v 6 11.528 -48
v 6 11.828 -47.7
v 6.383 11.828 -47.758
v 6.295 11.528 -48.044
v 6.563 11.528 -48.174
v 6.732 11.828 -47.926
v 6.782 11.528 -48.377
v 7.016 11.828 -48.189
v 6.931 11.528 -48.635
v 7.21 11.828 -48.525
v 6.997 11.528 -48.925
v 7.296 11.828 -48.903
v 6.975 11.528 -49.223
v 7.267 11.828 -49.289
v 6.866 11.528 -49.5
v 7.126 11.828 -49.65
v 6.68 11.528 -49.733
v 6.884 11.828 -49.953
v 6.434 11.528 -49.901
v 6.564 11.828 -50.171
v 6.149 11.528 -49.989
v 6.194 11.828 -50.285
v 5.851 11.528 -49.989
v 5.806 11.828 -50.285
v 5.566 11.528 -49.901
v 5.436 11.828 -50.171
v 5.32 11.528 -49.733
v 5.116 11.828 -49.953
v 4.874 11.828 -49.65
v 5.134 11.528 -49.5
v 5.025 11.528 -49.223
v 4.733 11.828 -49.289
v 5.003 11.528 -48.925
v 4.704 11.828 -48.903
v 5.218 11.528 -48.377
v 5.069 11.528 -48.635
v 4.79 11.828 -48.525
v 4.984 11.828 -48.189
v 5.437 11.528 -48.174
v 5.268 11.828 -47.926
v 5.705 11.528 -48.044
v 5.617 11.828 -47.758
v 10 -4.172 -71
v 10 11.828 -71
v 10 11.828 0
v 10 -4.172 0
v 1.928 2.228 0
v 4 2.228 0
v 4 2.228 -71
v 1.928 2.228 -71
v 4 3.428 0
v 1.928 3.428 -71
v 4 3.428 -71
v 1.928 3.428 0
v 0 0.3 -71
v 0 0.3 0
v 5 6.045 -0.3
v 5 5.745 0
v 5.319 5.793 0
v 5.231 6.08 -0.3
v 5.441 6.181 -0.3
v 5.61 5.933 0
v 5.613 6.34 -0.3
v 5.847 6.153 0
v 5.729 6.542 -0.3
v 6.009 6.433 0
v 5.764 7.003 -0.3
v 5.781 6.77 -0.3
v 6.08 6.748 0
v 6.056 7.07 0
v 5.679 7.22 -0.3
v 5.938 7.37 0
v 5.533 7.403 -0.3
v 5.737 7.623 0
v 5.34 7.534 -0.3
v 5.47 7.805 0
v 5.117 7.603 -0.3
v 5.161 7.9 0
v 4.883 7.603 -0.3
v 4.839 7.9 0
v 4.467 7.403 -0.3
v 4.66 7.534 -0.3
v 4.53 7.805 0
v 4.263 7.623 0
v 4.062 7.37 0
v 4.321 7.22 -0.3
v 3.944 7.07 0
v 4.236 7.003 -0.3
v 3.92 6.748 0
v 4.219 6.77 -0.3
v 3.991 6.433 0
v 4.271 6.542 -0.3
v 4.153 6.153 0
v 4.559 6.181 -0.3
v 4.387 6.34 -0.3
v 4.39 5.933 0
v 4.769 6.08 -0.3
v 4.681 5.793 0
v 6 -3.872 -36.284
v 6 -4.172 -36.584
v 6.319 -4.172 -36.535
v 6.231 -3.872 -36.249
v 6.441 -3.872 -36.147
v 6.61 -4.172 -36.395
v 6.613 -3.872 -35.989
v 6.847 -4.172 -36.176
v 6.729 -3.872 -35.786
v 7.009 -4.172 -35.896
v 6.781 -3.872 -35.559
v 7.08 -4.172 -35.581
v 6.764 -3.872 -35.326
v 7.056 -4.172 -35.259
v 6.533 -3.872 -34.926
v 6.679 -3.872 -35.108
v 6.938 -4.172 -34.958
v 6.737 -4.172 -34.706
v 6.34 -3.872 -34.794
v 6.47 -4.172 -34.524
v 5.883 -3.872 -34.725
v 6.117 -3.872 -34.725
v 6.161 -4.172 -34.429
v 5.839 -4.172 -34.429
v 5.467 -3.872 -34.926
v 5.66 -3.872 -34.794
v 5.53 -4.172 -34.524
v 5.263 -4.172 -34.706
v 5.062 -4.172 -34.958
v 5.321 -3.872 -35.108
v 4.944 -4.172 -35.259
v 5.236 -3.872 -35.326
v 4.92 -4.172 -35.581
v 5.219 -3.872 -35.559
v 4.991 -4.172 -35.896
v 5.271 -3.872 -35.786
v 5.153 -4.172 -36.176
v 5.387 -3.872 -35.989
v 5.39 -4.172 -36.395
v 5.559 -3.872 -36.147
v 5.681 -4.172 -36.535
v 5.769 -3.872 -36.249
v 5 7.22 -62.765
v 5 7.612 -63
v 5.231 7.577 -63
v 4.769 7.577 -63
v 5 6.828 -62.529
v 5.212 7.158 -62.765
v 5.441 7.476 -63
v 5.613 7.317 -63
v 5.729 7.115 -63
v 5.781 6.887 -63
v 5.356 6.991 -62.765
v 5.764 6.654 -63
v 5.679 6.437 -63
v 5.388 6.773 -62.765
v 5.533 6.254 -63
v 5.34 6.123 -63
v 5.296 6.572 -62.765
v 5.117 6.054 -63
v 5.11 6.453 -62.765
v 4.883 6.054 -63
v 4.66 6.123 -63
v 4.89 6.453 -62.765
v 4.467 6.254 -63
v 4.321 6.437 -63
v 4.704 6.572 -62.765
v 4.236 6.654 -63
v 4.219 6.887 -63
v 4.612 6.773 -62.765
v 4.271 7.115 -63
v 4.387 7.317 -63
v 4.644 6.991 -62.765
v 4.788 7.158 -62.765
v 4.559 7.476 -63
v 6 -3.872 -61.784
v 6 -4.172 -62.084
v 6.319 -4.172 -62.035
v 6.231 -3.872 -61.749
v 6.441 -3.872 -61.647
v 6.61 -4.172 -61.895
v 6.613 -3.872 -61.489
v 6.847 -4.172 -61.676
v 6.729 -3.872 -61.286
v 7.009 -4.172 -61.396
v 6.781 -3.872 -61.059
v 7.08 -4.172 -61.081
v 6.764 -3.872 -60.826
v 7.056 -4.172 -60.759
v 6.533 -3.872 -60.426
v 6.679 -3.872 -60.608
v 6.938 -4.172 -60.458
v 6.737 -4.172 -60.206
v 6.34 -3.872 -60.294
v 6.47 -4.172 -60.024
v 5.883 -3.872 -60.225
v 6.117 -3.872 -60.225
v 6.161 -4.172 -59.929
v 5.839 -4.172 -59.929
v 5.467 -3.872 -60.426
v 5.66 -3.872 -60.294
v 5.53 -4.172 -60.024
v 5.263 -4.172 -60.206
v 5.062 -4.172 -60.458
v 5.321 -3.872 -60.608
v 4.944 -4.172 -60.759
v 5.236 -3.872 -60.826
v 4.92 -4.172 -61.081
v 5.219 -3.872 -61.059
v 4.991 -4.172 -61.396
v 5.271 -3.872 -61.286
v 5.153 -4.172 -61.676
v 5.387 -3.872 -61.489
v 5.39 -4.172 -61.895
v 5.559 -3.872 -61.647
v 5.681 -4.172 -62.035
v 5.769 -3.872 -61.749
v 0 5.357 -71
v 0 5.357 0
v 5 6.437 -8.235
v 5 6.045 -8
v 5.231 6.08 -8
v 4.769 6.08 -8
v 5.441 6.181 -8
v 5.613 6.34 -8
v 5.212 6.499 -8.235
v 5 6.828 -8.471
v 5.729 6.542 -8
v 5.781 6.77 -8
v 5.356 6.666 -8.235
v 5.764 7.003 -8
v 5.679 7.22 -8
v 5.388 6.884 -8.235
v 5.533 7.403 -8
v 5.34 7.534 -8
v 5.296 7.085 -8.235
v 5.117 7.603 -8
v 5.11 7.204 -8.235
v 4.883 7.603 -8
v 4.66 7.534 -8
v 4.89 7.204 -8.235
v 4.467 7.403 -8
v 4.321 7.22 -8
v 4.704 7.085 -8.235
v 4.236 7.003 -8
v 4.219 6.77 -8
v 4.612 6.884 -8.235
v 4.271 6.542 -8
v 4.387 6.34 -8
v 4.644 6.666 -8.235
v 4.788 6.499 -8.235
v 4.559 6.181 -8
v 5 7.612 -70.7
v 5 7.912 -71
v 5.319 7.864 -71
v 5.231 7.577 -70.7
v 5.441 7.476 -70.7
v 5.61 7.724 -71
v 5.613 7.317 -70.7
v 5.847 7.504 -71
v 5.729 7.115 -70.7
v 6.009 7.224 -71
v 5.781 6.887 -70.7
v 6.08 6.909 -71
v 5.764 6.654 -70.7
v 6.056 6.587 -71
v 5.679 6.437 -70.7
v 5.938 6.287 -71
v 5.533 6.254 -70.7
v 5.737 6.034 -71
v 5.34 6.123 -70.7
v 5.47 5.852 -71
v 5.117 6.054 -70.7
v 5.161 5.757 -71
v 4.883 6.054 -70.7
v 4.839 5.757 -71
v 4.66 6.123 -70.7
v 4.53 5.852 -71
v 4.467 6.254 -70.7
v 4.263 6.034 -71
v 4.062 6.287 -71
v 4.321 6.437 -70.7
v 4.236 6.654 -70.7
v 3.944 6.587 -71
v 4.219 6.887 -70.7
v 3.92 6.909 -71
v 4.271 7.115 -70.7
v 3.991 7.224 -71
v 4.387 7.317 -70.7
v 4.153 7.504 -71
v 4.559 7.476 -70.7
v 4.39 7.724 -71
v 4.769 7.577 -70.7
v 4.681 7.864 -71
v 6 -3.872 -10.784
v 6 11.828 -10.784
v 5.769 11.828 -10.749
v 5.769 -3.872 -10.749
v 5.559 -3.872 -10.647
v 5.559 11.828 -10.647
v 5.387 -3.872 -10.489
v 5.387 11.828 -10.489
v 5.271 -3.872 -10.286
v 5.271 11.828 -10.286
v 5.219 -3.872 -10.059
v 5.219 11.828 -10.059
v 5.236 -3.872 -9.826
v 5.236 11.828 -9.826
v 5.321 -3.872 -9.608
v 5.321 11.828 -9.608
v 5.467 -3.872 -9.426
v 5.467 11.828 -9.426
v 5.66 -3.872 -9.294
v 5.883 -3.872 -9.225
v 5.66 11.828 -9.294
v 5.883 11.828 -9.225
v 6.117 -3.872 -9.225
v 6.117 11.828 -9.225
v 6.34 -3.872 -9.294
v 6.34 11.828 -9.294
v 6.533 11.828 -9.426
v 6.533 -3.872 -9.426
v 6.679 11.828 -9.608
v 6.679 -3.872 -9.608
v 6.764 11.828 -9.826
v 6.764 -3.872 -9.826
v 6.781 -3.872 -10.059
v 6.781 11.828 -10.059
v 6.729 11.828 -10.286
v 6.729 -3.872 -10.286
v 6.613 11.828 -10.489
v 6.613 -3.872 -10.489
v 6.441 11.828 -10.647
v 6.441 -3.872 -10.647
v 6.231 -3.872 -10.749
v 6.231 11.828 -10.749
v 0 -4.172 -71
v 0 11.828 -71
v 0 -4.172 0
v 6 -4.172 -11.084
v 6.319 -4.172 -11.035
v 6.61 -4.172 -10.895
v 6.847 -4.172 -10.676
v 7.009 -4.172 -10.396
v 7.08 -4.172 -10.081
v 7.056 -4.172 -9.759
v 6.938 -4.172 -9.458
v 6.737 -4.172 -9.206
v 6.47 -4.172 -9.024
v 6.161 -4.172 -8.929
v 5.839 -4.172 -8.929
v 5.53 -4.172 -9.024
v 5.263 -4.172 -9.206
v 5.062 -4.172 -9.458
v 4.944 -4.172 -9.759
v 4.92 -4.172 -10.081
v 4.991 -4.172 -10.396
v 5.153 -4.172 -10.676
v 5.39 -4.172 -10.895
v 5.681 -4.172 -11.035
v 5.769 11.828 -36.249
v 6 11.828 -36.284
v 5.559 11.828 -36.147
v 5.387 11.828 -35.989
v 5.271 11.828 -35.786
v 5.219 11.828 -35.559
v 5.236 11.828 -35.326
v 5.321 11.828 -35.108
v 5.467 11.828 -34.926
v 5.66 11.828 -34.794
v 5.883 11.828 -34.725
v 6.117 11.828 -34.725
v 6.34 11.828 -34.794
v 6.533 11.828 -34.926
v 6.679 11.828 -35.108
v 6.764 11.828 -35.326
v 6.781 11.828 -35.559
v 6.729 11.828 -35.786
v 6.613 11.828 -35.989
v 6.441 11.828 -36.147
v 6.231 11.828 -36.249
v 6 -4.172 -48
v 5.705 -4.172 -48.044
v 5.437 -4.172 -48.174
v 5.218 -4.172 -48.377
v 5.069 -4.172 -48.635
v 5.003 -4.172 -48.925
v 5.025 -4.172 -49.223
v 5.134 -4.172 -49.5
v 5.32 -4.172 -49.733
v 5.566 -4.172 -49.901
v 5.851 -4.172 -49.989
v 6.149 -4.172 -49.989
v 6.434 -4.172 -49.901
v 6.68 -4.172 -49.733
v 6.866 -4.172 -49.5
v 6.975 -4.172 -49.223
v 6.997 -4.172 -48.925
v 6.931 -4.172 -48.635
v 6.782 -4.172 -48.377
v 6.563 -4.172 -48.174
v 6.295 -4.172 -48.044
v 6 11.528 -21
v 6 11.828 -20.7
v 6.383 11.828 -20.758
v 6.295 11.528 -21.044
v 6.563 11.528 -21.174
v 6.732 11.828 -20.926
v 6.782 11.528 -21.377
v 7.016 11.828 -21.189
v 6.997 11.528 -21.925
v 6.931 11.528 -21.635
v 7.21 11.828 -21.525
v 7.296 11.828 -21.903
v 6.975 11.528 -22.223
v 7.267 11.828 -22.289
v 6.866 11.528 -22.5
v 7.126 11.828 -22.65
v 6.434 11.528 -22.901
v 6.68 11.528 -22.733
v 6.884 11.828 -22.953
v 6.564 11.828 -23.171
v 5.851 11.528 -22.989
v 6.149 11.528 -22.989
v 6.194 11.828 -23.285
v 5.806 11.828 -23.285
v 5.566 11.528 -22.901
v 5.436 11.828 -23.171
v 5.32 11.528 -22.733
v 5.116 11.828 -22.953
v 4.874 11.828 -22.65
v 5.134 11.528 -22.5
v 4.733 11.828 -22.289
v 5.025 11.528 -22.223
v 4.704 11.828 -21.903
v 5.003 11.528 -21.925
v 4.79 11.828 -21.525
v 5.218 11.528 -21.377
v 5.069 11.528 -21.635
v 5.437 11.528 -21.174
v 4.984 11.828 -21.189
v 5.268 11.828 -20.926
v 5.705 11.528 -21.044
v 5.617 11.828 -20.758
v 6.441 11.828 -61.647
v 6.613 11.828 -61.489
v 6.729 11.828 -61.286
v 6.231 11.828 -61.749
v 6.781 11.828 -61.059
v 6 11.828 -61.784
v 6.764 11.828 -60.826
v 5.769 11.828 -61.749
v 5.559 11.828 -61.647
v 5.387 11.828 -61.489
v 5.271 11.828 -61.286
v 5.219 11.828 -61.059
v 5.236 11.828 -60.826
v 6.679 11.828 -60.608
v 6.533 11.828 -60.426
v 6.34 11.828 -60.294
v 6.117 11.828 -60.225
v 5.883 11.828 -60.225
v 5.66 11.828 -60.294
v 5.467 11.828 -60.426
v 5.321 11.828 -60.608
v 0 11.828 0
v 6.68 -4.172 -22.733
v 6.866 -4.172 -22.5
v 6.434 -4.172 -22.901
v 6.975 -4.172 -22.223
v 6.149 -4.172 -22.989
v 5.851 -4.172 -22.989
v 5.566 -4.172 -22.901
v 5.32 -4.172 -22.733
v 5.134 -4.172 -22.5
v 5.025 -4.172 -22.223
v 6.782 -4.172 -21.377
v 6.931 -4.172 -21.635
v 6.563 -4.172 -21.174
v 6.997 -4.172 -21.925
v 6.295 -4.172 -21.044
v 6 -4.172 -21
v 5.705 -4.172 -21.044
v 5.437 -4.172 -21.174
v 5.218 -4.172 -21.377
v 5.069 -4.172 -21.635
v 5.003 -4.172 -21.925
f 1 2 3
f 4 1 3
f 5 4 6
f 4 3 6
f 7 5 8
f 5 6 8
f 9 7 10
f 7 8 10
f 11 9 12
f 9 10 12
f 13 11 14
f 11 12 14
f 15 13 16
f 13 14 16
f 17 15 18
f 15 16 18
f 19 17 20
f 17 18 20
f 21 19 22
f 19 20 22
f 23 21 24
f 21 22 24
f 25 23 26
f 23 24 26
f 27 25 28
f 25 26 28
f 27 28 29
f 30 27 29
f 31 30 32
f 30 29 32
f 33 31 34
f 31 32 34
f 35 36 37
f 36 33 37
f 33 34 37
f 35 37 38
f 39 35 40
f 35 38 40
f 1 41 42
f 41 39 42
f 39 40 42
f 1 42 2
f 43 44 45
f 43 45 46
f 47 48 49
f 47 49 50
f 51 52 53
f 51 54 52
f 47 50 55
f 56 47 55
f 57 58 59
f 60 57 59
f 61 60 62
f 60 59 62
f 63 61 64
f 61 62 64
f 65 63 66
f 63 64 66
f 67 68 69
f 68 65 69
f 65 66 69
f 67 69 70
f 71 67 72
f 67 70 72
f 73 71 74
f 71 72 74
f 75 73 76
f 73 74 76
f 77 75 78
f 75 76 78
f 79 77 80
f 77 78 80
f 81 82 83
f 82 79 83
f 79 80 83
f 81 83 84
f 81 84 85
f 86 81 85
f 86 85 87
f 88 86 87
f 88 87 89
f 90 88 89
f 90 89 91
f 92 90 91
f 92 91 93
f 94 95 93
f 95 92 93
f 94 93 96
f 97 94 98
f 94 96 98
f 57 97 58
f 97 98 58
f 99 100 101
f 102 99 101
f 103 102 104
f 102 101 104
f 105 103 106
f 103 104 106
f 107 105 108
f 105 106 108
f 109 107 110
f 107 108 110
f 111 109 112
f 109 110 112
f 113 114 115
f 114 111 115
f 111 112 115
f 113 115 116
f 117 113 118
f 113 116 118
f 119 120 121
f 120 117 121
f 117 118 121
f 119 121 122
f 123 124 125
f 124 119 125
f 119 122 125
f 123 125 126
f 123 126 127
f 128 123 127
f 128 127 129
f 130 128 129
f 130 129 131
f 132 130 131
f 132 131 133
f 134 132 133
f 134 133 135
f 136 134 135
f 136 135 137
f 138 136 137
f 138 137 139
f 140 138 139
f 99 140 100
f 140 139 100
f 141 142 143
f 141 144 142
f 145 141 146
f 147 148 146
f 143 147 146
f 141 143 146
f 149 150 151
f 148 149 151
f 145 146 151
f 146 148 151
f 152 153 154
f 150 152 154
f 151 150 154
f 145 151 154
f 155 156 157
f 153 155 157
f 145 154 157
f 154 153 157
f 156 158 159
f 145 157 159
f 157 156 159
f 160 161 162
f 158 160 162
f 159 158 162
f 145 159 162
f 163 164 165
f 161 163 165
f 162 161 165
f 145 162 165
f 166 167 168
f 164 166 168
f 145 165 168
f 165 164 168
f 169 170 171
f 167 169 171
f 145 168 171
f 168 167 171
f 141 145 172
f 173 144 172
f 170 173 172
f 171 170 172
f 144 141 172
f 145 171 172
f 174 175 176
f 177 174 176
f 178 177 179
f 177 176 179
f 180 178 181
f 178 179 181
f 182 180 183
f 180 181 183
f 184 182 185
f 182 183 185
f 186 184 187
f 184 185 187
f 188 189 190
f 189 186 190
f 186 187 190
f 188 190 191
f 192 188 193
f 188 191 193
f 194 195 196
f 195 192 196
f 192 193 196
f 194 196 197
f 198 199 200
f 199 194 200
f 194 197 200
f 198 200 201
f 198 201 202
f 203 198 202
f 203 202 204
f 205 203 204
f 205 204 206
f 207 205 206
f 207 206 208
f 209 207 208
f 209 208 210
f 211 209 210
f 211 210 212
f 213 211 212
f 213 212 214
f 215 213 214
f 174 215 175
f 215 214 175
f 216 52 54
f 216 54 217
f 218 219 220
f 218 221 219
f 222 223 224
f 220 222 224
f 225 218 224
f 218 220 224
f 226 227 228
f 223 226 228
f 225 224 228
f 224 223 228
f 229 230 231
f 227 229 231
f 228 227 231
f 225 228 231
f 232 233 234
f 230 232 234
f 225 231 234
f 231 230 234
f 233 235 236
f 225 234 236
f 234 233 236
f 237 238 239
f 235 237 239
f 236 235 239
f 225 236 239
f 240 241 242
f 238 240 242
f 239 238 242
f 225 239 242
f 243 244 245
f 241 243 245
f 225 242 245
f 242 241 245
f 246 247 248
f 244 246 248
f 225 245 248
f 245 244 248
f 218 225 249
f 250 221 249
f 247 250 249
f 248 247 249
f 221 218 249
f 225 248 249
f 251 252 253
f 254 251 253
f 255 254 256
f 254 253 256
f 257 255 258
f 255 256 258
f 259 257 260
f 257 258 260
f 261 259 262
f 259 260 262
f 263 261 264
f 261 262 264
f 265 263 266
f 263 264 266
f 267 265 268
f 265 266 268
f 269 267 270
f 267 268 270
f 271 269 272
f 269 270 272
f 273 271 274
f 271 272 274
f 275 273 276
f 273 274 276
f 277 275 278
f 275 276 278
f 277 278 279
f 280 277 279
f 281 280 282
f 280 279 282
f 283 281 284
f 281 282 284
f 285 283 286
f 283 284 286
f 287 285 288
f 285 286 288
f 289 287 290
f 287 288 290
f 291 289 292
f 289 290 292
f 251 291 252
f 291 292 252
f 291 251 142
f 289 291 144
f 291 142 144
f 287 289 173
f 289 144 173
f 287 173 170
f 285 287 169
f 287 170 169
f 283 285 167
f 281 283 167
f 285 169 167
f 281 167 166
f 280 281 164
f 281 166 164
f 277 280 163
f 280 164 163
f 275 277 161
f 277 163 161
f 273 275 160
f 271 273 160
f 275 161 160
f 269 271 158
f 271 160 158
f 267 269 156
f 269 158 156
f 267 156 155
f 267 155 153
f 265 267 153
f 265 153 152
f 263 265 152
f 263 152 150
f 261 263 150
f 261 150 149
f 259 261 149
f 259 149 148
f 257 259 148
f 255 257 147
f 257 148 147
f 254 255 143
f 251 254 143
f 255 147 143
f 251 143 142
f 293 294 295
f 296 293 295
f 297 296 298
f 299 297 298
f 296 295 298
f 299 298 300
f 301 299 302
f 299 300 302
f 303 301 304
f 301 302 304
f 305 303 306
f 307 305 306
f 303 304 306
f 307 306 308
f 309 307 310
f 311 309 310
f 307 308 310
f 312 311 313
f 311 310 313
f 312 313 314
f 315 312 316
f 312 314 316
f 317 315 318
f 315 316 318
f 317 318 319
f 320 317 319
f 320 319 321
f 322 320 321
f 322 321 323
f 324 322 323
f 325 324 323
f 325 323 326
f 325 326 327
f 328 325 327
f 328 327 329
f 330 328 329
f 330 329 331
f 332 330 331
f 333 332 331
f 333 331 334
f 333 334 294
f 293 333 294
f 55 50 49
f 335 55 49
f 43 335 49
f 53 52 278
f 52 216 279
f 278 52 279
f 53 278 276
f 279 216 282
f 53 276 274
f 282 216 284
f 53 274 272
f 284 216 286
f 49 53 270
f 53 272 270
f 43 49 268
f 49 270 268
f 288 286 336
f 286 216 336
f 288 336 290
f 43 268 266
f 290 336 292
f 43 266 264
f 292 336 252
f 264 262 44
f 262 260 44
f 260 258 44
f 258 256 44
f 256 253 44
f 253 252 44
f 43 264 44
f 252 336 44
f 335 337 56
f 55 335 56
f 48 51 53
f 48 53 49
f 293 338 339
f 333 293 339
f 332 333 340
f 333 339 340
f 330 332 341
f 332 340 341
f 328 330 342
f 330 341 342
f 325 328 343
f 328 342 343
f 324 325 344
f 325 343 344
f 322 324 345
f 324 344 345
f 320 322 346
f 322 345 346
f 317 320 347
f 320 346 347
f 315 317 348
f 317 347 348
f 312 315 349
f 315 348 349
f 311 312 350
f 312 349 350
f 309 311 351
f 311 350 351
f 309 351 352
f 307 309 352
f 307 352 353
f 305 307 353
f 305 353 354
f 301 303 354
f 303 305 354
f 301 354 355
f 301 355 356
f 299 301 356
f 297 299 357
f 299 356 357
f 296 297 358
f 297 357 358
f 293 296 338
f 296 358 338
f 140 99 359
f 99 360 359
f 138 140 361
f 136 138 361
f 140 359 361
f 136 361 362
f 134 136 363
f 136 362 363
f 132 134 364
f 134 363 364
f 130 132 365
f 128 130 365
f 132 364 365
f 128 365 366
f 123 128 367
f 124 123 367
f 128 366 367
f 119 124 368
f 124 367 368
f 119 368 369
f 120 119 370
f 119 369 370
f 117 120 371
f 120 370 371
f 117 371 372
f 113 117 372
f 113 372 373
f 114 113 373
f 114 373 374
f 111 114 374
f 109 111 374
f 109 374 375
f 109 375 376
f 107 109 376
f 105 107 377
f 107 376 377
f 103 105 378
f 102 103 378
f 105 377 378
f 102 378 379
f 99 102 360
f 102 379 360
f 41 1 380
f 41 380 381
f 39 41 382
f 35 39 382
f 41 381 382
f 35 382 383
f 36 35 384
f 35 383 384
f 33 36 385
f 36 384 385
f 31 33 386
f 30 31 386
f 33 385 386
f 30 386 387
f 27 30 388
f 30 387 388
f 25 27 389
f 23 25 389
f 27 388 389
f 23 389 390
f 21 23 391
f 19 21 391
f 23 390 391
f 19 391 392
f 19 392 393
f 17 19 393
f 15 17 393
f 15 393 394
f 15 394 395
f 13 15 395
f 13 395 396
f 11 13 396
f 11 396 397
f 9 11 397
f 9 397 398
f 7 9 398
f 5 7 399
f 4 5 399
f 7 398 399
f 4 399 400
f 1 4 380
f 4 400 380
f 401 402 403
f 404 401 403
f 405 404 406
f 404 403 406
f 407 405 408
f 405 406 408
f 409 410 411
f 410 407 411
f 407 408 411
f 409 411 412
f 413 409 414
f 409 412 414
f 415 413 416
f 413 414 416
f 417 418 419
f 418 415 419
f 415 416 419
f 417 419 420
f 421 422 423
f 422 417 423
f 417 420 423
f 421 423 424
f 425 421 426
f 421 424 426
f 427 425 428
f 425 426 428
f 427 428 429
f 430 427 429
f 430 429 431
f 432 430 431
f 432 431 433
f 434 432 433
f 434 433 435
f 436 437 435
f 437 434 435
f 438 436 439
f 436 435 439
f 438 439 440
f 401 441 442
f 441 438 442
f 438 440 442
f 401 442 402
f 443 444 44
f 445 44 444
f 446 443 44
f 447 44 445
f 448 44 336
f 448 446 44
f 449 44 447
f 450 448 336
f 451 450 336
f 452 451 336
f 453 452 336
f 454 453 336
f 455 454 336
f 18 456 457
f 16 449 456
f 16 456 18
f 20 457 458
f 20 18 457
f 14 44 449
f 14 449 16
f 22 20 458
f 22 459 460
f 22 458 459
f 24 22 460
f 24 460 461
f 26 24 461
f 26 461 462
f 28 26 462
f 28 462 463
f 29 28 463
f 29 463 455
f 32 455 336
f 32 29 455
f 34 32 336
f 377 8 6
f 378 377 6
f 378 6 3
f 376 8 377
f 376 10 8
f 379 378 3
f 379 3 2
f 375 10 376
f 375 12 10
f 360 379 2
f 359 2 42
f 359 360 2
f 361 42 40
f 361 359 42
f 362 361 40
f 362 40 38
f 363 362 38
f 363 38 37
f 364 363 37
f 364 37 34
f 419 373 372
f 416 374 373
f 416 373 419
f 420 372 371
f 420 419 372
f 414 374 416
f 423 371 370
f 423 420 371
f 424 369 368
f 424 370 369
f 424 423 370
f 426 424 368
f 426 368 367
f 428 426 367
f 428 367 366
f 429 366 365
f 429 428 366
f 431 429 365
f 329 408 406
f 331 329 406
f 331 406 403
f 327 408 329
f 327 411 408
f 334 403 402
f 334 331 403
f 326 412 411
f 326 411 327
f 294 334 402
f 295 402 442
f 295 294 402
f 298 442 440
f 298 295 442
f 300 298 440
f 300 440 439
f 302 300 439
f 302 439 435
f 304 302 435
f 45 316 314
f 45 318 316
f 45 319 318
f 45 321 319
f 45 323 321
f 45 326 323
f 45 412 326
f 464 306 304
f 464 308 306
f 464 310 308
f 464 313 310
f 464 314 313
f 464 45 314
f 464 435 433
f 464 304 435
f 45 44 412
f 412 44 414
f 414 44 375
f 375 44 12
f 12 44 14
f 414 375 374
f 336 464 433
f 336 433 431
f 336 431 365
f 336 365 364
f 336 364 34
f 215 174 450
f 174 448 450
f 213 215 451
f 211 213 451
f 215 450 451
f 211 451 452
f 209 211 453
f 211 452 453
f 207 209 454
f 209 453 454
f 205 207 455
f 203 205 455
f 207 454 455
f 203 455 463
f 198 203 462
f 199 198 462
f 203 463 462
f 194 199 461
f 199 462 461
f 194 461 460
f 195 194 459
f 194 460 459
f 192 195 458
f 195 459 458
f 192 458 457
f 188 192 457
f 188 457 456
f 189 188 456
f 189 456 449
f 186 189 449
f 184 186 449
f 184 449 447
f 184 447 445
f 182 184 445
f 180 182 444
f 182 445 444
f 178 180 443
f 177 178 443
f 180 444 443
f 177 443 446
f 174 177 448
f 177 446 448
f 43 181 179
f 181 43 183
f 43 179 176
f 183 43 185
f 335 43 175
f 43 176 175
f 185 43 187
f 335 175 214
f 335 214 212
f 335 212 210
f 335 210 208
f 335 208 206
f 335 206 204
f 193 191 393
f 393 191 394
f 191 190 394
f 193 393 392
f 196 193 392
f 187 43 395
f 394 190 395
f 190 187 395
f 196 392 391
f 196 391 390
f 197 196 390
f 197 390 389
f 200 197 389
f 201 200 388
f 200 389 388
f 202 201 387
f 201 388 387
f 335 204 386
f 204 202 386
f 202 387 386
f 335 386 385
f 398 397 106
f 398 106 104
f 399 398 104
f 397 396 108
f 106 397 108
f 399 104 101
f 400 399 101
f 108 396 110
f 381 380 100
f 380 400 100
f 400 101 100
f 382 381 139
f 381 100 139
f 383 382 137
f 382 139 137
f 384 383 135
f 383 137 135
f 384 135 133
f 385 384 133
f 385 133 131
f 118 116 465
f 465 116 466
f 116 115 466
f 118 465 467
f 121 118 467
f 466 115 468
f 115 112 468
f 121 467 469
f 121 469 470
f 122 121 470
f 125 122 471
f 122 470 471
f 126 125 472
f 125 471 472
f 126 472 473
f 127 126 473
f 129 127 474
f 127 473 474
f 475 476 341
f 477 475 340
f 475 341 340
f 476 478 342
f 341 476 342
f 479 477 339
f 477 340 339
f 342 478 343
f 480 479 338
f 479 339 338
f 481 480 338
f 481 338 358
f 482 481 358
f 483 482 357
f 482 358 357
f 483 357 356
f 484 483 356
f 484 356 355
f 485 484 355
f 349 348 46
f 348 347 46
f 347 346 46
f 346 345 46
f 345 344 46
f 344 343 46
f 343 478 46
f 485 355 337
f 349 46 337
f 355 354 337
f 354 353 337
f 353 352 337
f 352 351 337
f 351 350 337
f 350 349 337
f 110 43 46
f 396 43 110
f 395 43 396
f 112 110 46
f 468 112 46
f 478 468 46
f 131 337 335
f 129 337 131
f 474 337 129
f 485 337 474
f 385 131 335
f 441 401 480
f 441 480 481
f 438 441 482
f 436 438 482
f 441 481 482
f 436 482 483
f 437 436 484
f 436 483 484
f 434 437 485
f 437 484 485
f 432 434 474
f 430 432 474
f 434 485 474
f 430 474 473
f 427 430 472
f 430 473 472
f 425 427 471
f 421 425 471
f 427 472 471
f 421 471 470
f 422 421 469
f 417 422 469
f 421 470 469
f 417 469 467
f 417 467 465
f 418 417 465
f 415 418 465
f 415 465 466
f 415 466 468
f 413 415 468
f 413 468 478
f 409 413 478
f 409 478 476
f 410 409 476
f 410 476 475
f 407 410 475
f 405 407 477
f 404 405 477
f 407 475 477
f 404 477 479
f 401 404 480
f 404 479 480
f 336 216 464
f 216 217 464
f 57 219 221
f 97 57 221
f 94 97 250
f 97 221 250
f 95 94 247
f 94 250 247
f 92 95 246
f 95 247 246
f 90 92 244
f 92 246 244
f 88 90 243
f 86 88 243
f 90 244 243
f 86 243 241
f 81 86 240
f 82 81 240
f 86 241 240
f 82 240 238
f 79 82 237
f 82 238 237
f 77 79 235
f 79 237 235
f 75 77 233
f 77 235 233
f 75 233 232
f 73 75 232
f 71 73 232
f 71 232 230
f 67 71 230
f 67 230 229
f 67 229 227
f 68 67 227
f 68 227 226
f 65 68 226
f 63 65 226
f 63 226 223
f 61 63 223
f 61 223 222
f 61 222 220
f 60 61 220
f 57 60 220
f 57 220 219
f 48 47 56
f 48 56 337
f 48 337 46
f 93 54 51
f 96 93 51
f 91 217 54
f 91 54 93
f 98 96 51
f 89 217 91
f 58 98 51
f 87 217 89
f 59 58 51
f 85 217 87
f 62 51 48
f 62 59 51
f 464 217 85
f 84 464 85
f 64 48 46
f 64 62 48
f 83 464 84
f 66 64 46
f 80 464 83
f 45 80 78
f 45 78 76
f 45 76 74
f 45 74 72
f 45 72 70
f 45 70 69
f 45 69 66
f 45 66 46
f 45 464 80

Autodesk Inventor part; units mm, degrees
ref_plane "YZ Plane" through (0, 0, 0) normal (1, 0, 0) x (0, 1, 0)
ref_plane "XZ Plane" through (0, 0, 0) normal (0, 1, 0) x (-1, 0, 0)
ref_plane "XY Plane" through (0, 0, 0) normal (0, 0, 1) x (1, 0, 0)
sketch "Sketch1" plane through (0, 0, 0) normal (0, 0, 1) x (1, 0, 0)
  line L0 (0, 0) -> (0, 5.657)
  line L1 (2.8285, 3.4285) -> (2.2285, 3.4285)
  line L2 (2.8285, 2.2285) -> (2.2285, 2.2285)
  line L3 (2.2285, 3.4285) -> (2.8285, 3.4285)
  line L4 (2.8285, 2.2285) -> (2.2285, 2.2285)
  line L5 (2.2285, 3.4285) -> (4, 3.4285)
  line L6 (4, 2.2285) -> (2.8285, 2.2285)
  line L7 (2.2285, 3.4285) -> (4, 3.4285)
  line L8 (2.2285, 3.4285) -> (4, 3.4285)
  line L9 (0, -2.1715) -> (0, 0)
  line L10 (0, 5.657) -> (0, 6.8285)
  line L11 (8, -2.1715) -> (8, 6.8285)
  line L12 (4, 3.4285) -> (4, 3.4285)
  line L13 (4, 3.4285) -> (4, 2.2285)
  line L14 (4, 2.2285) -> (4, 2.2285)
  line L15 (8, -2.1715) -> (8, -4.1715)
  line L16 (8, -4.1715) -> (0, -4.1715)
  line L17 (2.2285, 3.4285) -> (1.9283, 3.4285)
  line L18 (1.9283, 3.4285) -> (0, 5.3568)
  line L19 (2.2285, 2.2285) -> (1.9283, 2.2285)
  line L20 (1.9283, 2.2285) -> (0, 0.3002)
  line L21 (0, -2.1715) -> (0, -4.1715)
  line L22 (4, 2.8285) -> (8, 2.8285) construction
  line L23 (8, 6.8285) -> (8, 11.8285)
  line L24 (8, 11.8285) -> (0, 11.8285)
  line L25 (0, 11.8285) -> (0, 6.8285)
  line L26 (8, 11.8285) -> (10, 11.8285)
  line L27 (10, 11.8285) -> (10, -4.1715)
  line L28 (10, -4.1715) -> (8, -4.1715)
  line L29 (10, 11.8285) -> (7, 11.8285) construction
  line L30 (10, 11.8285) -> (5, 11.8285) construction
  line L31 (5, 11.8285) -> (5, 6.7848) construction
  point P0 (4.938, 0.6604)
  point P1 (0.4, 0.4)
  point P2 (0.4, 5.257)
  point P3 (0.4, -2.1715)
  point P4 (0.25, 5.407)
  point P5 (0.25, -2.1715)
  point P6 (0.25, -4.1715)
  dimension "d11" = 8
  dimension "d23" = 4
  dimension "d24" = 7
  dimension "d25" = 5
  dimension "d26" = 2
  dimension "d29" = 5
  dimension "d78" = 4
extrude "Extrusion1" add sketch "Sketch1" against normal blind 71 contours L0 L20 L19 L2 L6 L13 L5 L1 L17 L18 L10 L25 L24 L23 L11 L15 L16 L21 L9 | L15 L11 L23 L26 L27 L28
sketch "Sketch2" plane through (0, 0, 0) normal (0, 0, 1) x (1, 0, 0)
  line L0 (10, -4.1715) -> (10, 11.8285) construction
  line L1 (10, 11.8285) -> (5, 11.8285) construction
  line L2 (10, 11.8285) -> (0, 11.8285) construction
  line L3 (5, 11.8285) -> (5, 6.8285) construction
  point P0 (0, 0)
  dimension "d30" = 5
hole "Hole1" at (5, 6.8285, 0) direction (0, 0, -1) diameter 1.567 depth 8 tip angle 118 thread size "M2x0.4" class "6H" standard "ANSI Metric M Profile"
sketch "Sketch3" plane through (0, 0, -71) normal (0, 0, -1) x (-1, 0, 0)
  line L0 (-10, 11.8285) -> (-10, -4.1715) construction
  line L1 (-10, 11.8285) -> (-5, 11.8285) construction
  line L2 (0, 11.8285) -> (-10, 11.8285) construction
  line L3 (-5, 11.8285) -> (-5, 6.8285) construction
  circle A0 centre (-5, 6.8285) radius 0.7835 construction
  point P0 (0, 0)
  dimension "d38" = 5
  dimension "d40" = 5
hole "Hole2" at (5, 6.8285, -71) direction (0, 0, 1) diameter 1.567 depth 8 tip angle 118 thread size "M2x0.4" class "6H" standard "ISO Metric profile"
chamfer "Chamfer1" distance 0.3 angle 45 1 edges at (5, 7.612, 0)
chamfer "Chamfer2" distance 0.3 angle 45 1 edges at (5, 6.045, -71)
sketch "Sketch4" plane through (0, -4.1715, 0) normal (0, -1, 0) x (1, 0, 0)
  line L0 (0, 0) -> (0, -71) construction
  line L1 (0, 0) -> (0, -10) construction
  line L2 (0, -10) -> (0, -35.5) construction
  line L3 (0, -71) -> (0, -61) construction
  line L4 (0, -35.5) -> (10, -35.5) construction
  line L5 (10, 0) -> (10, -71) construction
  line L6 (0, -61) -> (10, -61) construction
  line L7 (0, -10) -> (10, -10) construction
  line L8 (0, -71) -> (6, -71)
  line L9 (6, -71) -> (6, 0)
  point P0 (5, 0)
  point P1 (5, -71)
  point P2 (6, -61)
  point P3 (6, -35.5)
  point P4 (6, -10)
  dimension "d54" = 10
  dimension "d55" = 10
  dimension "d63" = 6
  dimension "d64" = 35.5
hole "Hole3" at (6, -4.1715, -10) at (6, -4.1715, -35.5) at (6, -4.1715, -61) direction (0, 1, 0) diameter 1.567 end through all thread size "M2x0.4" class "6H" standard "ISO Metric profile"
sketch "Sketch5" plane through (0, 11.8285, 0) normal (0, 1, 0) x (1, 0, 0)
  point P0 (0, 0)
chamfer "Chamfer3" distance 0.3 angle 45 1 edges at (6, -4.1715, -9.2165)
chamfer "Chamfer4" distance 0.3 angle 45 2 edges at (6, -4.1715, -34.7165) (6, -4.1715, -60.2165)
sketch "Sketch6" plane through (0, 11.8285, 0) normal (0, 1, 0) x (1, 0, 0)
  line L0 (0, 0) -> (10, 0) projected
  line L1 (4, 71) -> (4.3098, 49.0022) construction
  line L2 (5, 0) -> (4.6902, 21.9978) construction
  point P0 (5, 61.7835)
  dimension "d71" = 22
  dimension "d72" = 22
sketch "Sketch7" plane through (0, 11.8285, 0) normal (0, 1, 0) x (1, 0, 0)
  line L0 (0, 0) -> (10, 0) projected
  line L1 (0, 0) -> (7.5, 0)
  line L2 (7.5, 0) -> (7.5, 20)
  line L3 (0, 71) -> (10, 71) projected
  line L4 (0, 71) -> (7.5, 71)
  line L5 (7.5, 71) -> (7.5, 51)
  dimension "d73" = 7.5
  dimension "d74" = 20
  dimension "d76" = 7.5
  dimension "d77" = 20
sketch "Sketch8" plane through (0, 11.8285, 0) normal (0, 1, 0) x (1, 0, 0)
  line L0 (0, 0) -> (6, 0)
  line L1 (10, 0) -> (0, 0) projected
  line L2 (6, 0) -> (6, 22)
  line L3 (0, 71) -> (6, 71)
  line L4 (10, 71) -> (0, 71) projected
  line L5 (6, 71) -> (6, 49)
  dimension "d79" = 6
  dimension "d80" = 22
  dimension "d81" = 6
  dimension "d82" = 22
hole "Hole4" at (6, 11.8285, -49) at (6, 11.8285, -22) direction (0, -1, 0) diameter 2 end through all
chamfer "Chamfer5" distance 0.3 angle 45 2 edges at (6, 11.8285, -50) (6, 11.8285, -23)
properties part number "Guide" material "Steel, Carbon"
